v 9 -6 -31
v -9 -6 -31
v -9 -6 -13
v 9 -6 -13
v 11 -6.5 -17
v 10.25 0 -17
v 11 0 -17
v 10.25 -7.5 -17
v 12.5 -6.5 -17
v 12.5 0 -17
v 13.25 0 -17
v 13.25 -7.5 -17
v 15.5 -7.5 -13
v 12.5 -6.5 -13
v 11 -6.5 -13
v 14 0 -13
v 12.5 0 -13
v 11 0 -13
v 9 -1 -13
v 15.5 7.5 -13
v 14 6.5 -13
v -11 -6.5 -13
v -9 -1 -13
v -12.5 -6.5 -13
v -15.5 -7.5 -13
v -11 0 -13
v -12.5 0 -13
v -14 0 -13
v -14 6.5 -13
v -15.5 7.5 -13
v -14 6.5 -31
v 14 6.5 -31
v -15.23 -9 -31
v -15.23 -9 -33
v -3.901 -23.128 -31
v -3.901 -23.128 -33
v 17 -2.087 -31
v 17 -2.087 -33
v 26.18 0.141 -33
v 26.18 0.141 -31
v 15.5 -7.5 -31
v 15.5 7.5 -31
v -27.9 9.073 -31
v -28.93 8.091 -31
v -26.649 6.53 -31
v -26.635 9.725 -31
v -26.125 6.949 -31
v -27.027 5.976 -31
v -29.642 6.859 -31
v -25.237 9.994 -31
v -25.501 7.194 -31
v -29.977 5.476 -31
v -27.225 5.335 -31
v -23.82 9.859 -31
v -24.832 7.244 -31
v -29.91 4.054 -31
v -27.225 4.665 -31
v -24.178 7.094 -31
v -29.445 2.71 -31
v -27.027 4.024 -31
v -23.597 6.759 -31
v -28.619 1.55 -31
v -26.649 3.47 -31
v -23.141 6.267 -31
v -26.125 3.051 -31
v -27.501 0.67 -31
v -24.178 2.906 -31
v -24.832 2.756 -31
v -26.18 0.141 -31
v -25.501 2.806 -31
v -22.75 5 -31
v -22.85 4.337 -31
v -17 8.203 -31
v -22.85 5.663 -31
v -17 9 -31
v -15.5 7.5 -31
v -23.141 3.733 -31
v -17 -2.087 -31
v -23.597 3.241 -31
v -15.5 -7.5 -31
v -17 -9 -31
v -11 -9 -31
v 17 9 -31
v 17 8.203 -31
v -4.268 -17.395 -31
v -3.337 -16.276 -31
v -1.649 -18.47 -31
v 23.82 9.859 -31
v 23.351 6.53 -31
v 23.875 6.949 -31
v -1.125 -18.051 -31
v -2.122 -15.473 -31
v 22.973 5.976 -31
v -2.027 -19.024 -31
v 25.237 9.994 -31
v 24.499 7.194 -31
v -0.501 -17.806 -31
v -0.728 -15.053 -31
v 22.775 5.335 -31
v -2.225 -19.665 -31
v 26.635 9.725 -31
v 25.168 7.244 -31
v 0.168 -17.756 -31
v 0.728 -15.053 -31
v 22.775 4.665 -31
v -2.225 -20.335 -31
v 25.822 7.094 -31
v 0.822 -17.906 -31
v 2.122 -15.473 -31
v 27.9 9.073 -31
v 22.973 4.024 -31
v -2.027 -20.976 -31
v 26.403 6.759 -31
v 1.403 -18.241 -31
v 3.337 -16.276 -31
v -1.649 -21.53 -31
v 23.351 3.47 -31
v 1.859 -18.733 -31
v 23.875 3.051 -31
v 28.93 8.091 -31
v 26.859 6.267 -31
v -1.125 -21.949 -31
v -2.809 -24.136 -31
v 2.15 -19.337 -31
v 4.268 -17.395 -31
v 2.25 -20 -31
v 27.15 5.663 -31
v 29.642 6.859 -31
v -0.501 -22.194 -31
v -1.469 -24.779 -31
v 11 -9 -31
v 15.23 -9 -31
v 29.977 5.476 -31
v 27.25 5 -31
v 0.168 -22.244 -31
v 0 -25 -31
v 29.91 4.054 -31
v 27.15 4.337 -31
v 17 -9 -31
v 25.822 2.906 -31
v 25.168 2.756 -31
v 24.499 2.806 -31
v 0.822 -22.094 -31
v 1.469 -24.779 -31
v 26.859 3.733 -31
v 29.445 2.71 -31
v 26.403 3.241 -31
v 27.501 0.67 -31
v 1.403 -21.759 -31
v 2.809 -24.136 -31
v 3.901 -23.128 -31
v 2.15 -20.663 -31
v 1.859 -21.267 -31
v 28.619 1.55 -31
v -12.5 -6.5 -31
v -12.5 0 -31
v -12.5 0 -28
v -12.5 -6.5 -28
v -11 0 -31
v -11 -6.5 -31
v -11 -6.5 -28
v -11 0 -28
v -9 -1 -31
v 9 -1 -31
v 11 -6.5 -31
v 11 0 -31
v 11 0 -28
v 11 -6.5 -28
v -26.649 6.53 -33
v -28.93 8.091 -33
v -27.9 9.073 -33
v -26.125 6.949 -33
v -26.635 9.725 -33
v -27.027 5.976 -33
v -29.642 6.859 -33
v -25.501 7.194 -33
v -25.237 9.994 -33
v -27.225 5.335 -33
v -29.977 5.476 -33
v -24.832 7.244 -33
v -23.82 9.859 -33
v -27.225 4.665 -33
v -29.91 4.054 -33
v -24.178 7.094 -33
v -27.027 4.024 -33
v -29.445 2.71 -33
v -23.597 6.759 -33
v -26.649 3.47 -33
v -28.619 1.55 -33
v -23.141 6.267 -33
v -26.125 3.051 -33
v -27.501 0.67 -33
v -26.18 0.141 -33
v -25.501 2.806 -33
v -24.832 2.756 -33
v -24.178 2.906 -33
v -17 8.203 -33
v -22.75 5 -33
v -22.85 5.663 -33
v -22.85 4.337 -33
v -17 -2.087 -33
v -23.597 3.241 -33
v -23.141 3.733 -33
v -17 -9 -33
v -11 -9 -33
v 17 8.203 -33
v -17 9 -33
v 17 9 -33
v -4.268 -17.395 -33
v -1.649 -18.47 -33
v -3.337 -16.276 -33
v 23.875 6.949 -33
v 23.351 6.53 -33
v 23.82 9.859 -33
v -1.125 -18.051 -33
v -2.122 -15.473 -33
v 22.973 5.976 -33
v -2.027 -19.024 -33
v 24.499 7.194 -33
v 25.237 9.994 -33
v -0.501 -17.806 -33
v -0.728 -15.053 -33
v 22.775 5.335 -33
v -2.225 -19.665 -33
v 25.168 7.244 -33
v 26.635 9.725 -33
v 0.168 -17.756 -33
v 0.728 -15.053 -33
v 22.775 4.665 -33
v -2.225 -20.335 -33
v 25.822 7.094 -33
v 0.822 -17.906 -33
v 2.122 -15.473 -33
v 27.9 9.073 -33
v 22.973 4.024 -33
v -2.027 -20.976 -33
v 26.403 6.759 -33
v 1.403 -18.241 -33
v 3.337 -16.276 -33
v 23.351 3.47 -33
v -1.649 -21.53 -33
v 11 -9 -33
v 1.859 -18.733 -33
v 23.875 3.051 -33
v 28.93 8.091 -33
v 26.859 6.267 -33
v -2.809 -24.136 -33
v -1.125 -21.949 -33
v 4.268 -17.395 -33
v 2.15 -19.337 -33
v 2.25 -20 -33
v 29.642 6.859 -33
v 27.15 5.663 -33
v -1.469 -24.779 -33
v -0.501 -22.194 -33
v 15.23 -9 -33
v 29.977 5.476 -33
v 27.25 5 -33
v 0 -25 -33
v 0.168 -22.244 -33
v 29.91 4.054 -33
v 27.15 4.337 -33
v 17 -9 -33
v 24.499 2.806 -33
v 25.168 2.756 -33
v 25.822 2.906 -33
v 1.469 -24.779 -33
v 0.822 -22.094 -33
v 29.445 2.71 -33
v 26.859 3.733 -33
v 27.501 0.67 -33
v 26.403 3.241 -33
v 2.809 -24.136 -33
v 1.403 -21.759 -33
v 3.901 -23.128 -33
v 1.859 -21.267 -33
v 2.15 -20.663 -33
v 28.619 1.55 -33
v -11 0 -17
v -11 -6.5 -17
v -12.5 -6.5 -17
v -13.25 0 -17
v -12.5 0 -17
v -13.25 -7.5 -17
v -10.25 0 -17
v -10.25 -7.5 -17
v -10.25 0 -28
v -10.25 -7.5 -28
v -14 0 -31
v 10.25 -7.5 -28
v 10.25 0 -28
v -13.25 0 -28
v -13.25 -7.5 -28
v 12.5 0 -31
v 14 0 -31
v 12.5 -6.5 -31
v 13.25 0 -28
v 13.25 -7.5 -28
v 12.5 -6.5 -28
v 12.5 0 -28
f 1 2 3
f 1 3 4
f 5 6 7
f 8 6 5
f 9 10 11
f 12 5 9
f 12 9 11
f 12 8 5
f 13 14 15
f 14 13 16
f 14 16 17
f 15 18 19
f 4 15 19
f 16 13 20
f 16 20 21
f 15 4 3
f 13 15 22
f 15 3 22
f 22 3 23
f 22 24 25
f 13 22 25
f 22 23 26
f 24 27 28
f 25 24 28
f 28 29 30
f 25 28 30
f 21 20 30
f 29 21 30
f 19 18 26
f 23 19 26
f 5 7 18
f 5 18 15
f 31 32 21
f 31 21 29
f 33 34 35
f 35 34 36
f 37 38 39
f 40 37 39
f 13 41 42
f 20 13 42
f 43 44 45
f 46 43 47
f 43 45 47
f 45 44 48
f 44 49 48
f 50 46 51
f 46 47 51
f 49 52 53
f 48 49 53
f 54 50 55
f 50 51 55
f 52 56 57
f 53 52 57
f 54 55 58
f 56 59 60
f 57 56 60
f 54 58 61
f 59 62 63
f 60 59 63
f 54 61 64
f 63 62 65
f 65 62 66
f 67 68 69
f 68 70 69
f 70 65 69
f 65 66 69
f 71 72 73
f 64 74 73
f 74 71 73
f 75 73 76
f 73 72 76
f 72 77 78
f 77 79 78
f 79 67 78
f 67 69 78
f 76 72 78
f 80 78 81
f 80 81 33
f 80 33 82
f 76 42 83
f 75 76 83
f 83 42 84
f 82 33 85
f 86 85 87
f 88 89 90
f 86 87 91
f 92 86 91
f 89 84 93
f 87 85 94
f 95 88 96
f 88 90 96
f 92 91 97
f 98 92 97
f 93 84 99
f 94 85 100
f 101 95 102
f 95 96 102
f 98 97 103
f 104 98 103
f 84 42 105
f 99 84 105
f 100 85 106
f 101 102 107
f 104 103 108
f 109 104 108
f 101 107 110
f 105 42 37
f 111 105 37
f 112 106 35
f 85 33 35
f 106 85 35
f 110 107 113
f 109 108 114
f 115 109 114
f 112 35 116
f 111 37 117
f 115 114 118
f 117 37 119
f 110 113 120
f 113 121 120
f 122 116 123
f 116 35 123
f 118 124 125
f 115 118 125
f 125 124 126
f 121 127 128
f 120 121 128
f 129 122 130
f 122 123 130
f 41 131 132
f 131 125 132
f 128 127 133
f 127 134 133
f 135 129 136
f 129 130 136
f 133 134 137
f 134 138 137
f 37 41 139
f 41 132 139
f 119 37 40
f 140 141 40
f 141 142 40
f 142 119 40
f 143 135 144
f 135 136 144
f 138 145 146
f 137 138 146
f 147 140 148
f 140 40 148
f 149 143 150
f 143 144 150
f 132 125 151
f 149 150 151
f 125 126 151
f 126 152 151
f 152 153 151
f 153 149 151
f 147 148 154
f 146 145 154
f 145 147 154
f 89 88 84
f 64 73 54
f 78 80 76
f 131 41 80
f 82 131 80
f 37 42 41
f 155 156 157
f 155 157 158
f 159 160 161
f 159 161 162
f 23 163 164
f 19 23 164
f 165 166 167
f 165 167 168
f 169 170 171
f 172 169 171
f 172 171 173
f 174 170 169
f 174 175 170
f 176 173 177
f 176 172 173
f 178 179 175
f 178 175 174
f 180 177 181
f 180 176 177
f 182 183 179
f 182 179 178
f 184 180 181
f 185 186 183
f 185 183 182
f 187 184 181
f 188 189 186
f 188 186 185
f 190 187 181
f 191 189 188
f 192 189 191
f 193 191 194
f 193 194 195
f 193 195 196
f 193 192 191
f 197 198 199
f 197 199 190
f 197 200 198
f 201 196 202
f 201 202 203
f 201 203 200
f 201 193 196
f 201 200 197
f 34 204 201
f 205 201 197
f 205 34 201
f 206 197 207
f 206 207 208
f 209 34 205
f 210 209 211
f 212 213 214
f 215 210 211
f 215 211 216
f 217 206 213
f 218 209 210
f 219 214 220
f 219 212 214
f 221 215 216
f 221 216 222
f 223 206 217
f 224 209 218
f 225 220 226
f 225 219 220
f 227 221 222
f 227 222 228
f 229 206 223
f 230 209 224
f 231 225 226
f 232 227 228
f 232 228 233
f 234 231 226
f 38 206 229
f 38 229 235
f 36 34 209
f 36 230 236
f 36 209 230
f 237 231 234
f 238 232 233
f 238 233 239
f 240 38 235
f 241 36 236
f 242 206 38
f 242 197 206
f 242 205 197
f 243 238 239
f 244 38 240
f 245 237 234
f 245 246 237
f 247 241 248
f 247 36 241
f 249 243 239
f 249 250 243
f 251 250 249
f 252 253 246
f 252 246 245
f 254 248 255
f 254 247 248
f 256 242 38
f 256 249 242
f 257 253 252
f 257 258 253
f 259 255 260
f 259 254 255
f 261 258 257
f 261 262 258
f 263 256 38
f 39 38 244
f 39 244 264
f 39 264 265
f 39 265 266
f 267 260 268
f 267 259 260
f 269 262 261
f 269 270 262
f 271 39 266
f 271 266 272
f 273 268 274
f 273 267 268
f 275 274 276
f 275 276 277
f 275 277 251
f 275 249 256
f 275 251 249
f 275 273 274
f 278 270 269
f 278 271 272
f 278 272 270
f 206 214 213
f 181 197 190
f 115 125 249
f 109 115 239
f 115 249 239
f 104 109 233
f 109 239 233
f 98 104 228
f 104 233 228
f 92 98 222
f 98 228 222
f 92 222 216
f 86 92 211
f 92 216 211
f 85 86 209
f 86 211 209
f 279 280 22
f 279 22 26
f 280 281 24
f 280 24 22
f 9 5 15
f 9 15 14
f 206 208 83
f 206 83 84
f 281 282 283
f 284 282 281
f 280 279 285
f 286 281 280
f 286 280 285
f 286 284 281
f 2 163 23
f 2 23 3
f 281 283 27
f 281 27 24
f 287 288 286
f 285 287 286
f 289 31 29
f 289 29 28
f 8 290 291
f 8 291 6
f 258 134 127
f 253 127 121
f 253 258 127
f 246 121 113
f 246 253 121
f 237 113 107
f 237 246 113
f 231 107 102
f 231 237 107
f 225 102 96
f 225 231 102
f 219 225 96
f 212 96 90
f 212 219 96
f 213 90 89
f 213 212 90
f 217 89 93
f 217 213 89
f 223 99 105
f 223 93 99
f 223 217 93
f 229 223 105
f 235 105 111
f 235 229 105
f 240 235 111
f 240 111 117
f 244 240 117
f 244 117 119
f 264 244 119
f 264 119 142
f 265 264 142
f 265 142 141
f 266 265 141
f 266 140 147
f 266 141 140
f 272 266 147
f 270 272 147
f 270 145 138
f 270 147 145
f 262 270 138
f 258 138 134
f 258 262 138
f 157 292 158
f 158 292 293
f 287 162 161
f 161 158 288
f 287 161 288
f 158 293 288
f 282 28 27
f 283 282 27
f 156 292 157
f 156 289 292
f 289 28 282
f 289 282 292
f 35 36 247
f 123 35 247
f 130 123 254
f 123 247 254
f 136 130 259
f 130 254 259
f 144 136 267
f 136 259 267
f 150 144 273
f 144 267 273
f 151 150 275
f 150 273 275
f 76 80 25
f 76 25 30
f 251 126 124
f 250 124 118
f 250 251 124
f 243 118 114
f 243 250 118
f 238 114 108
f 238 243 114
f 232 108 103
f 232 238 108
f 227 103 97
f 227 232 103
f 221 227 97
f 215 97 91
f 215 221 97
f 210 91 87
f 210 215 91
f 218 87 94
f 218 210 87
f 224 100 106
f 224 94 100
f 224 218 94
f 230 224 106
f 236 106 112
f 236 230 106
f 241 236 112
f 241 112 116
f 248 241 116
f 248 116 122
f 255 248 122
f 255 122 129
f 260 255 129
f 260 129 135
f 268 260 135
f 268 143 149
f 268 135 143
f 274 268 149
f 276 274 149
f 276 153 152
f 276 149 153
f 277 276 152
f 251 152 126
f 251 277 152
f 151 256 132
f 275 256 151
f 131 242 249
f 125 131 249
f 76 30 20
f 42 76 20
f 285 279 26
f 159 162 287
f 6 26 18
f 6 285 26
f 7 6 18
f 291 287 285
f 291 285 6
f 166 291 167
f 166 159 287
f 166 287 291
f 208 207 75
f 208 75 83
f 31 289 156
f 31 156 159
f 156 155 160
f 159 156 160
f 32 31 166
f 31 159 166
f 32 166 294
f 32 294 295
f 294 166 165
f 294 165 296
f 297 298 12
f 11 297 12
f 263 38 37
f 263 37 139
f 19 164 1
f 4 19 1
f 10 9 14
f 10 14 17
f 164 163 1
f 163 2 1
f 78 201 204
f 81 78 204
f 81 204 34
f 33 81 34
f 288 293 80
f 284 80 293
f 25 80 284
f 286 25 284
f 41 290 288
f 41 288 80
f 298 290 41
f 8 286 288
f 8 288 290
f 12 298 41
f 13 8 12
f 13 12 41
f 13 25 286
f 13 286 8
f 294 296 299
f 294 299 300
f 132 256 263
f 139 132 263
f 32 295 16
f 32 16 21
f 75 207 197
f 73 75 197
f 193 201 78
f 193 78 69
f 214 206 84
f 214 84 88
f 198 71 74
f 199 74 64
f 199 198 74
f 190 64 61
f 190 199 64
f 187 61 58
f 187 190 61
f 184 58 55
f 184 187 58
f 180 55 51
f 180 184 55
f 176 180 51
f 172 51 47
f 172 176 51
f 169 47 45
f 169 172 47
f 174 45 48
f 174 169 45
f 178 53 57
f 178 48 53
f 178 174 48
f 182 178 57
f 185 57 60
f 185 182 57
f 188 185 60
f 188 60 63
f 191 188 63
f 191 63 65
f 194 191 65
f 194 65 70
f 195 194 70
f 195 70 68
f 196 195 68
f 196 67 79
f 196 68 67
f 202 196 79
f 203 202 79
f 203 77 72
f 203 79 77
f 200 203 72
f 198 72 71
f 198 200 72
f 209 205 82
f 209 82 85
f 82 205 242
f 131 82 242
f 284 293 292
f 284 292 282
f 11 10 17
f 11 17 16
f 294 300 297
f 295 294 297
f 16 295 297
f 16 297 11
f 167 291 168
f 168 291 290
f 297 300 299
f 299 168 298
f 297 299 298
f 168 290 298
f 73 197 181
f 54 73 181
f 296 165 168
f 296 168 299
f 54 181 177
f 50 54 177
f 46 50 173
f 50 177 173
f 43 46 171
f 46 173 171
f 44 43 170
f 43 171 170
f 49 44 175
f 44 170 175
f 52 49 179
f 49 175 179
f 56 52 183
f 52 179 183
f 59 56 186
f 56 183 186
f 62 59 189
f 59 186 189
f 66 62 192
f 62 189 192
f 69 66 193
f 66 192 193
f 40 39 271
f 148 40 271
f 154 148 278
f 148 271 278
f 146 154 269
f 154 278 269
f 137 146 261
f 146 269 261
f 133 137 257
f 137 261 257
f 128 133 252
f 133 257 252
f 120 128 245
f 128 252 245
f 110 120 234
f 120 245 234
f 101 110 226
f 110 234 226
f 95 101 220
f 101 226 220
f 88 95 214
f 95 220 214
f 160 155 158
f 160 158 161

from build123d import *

# Parameters (mm, degrees)
PAD132_DEPTH    = 20
SKETCH277_W     = 18
SKETCH277_H     = 5
POCKET115_DEPTH = 20
SKETCH278_W     = 34
SKETCH278_H     = 18
PAD133_DEPTH    = 2
SKETCH279_W     = 61
SKETCH279_H     = 49.5
SKETCH279_W_2   = 31
SKETCH279_H_2   = 15
POCKET116_DEPTH = 18
SKETCH280_R     = 2.25
POCKET117_DEPTH = 5
SKETCH281_W     = 3
SKETCH281_H     = 11
POCKET118_DEPTH = 8


with BuildPart() as part:
    # Sketch276 → Pad132 (new body)
    with BuildSketch(Plane.XY):
        with BuildLine():
            Line((-16, 7.96043), (16, 7.96043))
            Line((16, 7.96043), (23.820487, 9.858884))
            ThreePointArc((26.179513, 0.141116), (29.858884, 6.179513), (23.820487, 9.858884))
            Line((16, -2.33), (26.179513, 0.141116))
            Line((16, -2.33), (16, -8.03957))
            Line((16, -8.03957), (3.900743, -23.127972))
            ThreePointArc((-3.900743, -23.127972), (0, -25), (3.900743, -23.127972))
            Line((-16, -8.03957), (-3.900743, -23.127972))
            Line((-16, -8.03957), (-16, -2.33))
            Line((-16, -2.33), (-26.179513, 0.141116))
            ThreePointArc((-23.820487, 9.858884), (-29.858884, 6.179513), (-26.179513, 0.141116))
            Line((-16, 7.96043), (-23.820487, 9.858884))
        make_face()
        Polygon((-14, 6.5), (-14, 0), (-12.5, 0), (-12.5, -6.5), (-11, -6.5), (-11, 0), (11, 0), (11, -6.5), (12.5, -6.5), (12.5, 0), (14, 0), (14, 6.5), align=None, mode=Mode.SUBTRACT)
        with BuildLine():
            ThreePointArc((4.26793, -17.39524), (0, -15), (-4.26793, -17.39524))
            Line((-11, -9), (-4.26793, -17.39524))
            Line((-11, -9), (11, -9))
            Line((11, -9), (4.26793, -17.39524))
        make_face(mode=Mode.SUBTRACT)
    extrude(amount=PAD132_DEPTH)

    # Sketch277 (on Face29 of Pad132) → Pocket115 (cut)
    with BuildSketch(Plane(origin=(0, 0, 0), x_dir=(1, 0, 0), z_dir=(0, 0, -1))):
        with Locations((0, 3.5)):
            Rectangle(SKETCH277_W, SKETCH277_H)
    extrude(amount=-POCKET115_DEPTH, mode=Mode.SUBTRACT)

    # Sketch278 (on Face4 of Pocket115) → Pad133 (join)
    with BuildSketch(Plane(origin=(0, 0, 0), x_dir=(1, 0, 0), z_dir=(0, 0, -1))):
        Rectangle(SKETCH278_W, SKETCH278_H)
    extrude(amount=-PAD133_DEPTH)

    # Sketch279 (on Face32 of Pad133) → Pocket116 (cut, symmetric)
    with BuildSketch(Plane.XY.offset(20)):
        with Locations((0, -4.75)):
            Rectangle(SKETCH279_W, SKETCH279_H)
        Rectangle(SKETCH279_W_2, SKETCH279_H_2, mode=Mode.SUBTRACT)
    extrude(amount=POCKET116_DEPTH, both=True, mode=Mode.SUBTRACT)

    # Sketch280 → Pocket117 (cut)
    with BuildSketch(Plane.XY):
        with Locations((0, -20)):
            Circle(SKETCH280_R)
        with Locations((25, 5)):
            Circle(SKETCH280_R)
        with Locations((-25, 5)):
            Circle(SKETCH280_R)
    extrude(amount=POCKET117_DEPTH, mode=Mode.SUBTRACT)

    # Sketch281 (on Face37 of Pocket117) → Pocket118 (cut)
    with BuildSketch(Plane.XZ.offset(7.5)):
        with Locations((-11.75, 10.5)):
            Rectangle(SKETCH281_W, SKETCH281_H)
        with Locations((11.75, 10.5)):
            Rectangle(SKETCH281_W, SKETCH281_H)
    extrude(amount=-POCKET118_DEPTH, mode=Mode.SUBTRACT)


with BuildPart() as part_1:
    # Body030 placement: moved
    add(part.part.moved(Location((0, 0, -33))))


solid = part_1.part
